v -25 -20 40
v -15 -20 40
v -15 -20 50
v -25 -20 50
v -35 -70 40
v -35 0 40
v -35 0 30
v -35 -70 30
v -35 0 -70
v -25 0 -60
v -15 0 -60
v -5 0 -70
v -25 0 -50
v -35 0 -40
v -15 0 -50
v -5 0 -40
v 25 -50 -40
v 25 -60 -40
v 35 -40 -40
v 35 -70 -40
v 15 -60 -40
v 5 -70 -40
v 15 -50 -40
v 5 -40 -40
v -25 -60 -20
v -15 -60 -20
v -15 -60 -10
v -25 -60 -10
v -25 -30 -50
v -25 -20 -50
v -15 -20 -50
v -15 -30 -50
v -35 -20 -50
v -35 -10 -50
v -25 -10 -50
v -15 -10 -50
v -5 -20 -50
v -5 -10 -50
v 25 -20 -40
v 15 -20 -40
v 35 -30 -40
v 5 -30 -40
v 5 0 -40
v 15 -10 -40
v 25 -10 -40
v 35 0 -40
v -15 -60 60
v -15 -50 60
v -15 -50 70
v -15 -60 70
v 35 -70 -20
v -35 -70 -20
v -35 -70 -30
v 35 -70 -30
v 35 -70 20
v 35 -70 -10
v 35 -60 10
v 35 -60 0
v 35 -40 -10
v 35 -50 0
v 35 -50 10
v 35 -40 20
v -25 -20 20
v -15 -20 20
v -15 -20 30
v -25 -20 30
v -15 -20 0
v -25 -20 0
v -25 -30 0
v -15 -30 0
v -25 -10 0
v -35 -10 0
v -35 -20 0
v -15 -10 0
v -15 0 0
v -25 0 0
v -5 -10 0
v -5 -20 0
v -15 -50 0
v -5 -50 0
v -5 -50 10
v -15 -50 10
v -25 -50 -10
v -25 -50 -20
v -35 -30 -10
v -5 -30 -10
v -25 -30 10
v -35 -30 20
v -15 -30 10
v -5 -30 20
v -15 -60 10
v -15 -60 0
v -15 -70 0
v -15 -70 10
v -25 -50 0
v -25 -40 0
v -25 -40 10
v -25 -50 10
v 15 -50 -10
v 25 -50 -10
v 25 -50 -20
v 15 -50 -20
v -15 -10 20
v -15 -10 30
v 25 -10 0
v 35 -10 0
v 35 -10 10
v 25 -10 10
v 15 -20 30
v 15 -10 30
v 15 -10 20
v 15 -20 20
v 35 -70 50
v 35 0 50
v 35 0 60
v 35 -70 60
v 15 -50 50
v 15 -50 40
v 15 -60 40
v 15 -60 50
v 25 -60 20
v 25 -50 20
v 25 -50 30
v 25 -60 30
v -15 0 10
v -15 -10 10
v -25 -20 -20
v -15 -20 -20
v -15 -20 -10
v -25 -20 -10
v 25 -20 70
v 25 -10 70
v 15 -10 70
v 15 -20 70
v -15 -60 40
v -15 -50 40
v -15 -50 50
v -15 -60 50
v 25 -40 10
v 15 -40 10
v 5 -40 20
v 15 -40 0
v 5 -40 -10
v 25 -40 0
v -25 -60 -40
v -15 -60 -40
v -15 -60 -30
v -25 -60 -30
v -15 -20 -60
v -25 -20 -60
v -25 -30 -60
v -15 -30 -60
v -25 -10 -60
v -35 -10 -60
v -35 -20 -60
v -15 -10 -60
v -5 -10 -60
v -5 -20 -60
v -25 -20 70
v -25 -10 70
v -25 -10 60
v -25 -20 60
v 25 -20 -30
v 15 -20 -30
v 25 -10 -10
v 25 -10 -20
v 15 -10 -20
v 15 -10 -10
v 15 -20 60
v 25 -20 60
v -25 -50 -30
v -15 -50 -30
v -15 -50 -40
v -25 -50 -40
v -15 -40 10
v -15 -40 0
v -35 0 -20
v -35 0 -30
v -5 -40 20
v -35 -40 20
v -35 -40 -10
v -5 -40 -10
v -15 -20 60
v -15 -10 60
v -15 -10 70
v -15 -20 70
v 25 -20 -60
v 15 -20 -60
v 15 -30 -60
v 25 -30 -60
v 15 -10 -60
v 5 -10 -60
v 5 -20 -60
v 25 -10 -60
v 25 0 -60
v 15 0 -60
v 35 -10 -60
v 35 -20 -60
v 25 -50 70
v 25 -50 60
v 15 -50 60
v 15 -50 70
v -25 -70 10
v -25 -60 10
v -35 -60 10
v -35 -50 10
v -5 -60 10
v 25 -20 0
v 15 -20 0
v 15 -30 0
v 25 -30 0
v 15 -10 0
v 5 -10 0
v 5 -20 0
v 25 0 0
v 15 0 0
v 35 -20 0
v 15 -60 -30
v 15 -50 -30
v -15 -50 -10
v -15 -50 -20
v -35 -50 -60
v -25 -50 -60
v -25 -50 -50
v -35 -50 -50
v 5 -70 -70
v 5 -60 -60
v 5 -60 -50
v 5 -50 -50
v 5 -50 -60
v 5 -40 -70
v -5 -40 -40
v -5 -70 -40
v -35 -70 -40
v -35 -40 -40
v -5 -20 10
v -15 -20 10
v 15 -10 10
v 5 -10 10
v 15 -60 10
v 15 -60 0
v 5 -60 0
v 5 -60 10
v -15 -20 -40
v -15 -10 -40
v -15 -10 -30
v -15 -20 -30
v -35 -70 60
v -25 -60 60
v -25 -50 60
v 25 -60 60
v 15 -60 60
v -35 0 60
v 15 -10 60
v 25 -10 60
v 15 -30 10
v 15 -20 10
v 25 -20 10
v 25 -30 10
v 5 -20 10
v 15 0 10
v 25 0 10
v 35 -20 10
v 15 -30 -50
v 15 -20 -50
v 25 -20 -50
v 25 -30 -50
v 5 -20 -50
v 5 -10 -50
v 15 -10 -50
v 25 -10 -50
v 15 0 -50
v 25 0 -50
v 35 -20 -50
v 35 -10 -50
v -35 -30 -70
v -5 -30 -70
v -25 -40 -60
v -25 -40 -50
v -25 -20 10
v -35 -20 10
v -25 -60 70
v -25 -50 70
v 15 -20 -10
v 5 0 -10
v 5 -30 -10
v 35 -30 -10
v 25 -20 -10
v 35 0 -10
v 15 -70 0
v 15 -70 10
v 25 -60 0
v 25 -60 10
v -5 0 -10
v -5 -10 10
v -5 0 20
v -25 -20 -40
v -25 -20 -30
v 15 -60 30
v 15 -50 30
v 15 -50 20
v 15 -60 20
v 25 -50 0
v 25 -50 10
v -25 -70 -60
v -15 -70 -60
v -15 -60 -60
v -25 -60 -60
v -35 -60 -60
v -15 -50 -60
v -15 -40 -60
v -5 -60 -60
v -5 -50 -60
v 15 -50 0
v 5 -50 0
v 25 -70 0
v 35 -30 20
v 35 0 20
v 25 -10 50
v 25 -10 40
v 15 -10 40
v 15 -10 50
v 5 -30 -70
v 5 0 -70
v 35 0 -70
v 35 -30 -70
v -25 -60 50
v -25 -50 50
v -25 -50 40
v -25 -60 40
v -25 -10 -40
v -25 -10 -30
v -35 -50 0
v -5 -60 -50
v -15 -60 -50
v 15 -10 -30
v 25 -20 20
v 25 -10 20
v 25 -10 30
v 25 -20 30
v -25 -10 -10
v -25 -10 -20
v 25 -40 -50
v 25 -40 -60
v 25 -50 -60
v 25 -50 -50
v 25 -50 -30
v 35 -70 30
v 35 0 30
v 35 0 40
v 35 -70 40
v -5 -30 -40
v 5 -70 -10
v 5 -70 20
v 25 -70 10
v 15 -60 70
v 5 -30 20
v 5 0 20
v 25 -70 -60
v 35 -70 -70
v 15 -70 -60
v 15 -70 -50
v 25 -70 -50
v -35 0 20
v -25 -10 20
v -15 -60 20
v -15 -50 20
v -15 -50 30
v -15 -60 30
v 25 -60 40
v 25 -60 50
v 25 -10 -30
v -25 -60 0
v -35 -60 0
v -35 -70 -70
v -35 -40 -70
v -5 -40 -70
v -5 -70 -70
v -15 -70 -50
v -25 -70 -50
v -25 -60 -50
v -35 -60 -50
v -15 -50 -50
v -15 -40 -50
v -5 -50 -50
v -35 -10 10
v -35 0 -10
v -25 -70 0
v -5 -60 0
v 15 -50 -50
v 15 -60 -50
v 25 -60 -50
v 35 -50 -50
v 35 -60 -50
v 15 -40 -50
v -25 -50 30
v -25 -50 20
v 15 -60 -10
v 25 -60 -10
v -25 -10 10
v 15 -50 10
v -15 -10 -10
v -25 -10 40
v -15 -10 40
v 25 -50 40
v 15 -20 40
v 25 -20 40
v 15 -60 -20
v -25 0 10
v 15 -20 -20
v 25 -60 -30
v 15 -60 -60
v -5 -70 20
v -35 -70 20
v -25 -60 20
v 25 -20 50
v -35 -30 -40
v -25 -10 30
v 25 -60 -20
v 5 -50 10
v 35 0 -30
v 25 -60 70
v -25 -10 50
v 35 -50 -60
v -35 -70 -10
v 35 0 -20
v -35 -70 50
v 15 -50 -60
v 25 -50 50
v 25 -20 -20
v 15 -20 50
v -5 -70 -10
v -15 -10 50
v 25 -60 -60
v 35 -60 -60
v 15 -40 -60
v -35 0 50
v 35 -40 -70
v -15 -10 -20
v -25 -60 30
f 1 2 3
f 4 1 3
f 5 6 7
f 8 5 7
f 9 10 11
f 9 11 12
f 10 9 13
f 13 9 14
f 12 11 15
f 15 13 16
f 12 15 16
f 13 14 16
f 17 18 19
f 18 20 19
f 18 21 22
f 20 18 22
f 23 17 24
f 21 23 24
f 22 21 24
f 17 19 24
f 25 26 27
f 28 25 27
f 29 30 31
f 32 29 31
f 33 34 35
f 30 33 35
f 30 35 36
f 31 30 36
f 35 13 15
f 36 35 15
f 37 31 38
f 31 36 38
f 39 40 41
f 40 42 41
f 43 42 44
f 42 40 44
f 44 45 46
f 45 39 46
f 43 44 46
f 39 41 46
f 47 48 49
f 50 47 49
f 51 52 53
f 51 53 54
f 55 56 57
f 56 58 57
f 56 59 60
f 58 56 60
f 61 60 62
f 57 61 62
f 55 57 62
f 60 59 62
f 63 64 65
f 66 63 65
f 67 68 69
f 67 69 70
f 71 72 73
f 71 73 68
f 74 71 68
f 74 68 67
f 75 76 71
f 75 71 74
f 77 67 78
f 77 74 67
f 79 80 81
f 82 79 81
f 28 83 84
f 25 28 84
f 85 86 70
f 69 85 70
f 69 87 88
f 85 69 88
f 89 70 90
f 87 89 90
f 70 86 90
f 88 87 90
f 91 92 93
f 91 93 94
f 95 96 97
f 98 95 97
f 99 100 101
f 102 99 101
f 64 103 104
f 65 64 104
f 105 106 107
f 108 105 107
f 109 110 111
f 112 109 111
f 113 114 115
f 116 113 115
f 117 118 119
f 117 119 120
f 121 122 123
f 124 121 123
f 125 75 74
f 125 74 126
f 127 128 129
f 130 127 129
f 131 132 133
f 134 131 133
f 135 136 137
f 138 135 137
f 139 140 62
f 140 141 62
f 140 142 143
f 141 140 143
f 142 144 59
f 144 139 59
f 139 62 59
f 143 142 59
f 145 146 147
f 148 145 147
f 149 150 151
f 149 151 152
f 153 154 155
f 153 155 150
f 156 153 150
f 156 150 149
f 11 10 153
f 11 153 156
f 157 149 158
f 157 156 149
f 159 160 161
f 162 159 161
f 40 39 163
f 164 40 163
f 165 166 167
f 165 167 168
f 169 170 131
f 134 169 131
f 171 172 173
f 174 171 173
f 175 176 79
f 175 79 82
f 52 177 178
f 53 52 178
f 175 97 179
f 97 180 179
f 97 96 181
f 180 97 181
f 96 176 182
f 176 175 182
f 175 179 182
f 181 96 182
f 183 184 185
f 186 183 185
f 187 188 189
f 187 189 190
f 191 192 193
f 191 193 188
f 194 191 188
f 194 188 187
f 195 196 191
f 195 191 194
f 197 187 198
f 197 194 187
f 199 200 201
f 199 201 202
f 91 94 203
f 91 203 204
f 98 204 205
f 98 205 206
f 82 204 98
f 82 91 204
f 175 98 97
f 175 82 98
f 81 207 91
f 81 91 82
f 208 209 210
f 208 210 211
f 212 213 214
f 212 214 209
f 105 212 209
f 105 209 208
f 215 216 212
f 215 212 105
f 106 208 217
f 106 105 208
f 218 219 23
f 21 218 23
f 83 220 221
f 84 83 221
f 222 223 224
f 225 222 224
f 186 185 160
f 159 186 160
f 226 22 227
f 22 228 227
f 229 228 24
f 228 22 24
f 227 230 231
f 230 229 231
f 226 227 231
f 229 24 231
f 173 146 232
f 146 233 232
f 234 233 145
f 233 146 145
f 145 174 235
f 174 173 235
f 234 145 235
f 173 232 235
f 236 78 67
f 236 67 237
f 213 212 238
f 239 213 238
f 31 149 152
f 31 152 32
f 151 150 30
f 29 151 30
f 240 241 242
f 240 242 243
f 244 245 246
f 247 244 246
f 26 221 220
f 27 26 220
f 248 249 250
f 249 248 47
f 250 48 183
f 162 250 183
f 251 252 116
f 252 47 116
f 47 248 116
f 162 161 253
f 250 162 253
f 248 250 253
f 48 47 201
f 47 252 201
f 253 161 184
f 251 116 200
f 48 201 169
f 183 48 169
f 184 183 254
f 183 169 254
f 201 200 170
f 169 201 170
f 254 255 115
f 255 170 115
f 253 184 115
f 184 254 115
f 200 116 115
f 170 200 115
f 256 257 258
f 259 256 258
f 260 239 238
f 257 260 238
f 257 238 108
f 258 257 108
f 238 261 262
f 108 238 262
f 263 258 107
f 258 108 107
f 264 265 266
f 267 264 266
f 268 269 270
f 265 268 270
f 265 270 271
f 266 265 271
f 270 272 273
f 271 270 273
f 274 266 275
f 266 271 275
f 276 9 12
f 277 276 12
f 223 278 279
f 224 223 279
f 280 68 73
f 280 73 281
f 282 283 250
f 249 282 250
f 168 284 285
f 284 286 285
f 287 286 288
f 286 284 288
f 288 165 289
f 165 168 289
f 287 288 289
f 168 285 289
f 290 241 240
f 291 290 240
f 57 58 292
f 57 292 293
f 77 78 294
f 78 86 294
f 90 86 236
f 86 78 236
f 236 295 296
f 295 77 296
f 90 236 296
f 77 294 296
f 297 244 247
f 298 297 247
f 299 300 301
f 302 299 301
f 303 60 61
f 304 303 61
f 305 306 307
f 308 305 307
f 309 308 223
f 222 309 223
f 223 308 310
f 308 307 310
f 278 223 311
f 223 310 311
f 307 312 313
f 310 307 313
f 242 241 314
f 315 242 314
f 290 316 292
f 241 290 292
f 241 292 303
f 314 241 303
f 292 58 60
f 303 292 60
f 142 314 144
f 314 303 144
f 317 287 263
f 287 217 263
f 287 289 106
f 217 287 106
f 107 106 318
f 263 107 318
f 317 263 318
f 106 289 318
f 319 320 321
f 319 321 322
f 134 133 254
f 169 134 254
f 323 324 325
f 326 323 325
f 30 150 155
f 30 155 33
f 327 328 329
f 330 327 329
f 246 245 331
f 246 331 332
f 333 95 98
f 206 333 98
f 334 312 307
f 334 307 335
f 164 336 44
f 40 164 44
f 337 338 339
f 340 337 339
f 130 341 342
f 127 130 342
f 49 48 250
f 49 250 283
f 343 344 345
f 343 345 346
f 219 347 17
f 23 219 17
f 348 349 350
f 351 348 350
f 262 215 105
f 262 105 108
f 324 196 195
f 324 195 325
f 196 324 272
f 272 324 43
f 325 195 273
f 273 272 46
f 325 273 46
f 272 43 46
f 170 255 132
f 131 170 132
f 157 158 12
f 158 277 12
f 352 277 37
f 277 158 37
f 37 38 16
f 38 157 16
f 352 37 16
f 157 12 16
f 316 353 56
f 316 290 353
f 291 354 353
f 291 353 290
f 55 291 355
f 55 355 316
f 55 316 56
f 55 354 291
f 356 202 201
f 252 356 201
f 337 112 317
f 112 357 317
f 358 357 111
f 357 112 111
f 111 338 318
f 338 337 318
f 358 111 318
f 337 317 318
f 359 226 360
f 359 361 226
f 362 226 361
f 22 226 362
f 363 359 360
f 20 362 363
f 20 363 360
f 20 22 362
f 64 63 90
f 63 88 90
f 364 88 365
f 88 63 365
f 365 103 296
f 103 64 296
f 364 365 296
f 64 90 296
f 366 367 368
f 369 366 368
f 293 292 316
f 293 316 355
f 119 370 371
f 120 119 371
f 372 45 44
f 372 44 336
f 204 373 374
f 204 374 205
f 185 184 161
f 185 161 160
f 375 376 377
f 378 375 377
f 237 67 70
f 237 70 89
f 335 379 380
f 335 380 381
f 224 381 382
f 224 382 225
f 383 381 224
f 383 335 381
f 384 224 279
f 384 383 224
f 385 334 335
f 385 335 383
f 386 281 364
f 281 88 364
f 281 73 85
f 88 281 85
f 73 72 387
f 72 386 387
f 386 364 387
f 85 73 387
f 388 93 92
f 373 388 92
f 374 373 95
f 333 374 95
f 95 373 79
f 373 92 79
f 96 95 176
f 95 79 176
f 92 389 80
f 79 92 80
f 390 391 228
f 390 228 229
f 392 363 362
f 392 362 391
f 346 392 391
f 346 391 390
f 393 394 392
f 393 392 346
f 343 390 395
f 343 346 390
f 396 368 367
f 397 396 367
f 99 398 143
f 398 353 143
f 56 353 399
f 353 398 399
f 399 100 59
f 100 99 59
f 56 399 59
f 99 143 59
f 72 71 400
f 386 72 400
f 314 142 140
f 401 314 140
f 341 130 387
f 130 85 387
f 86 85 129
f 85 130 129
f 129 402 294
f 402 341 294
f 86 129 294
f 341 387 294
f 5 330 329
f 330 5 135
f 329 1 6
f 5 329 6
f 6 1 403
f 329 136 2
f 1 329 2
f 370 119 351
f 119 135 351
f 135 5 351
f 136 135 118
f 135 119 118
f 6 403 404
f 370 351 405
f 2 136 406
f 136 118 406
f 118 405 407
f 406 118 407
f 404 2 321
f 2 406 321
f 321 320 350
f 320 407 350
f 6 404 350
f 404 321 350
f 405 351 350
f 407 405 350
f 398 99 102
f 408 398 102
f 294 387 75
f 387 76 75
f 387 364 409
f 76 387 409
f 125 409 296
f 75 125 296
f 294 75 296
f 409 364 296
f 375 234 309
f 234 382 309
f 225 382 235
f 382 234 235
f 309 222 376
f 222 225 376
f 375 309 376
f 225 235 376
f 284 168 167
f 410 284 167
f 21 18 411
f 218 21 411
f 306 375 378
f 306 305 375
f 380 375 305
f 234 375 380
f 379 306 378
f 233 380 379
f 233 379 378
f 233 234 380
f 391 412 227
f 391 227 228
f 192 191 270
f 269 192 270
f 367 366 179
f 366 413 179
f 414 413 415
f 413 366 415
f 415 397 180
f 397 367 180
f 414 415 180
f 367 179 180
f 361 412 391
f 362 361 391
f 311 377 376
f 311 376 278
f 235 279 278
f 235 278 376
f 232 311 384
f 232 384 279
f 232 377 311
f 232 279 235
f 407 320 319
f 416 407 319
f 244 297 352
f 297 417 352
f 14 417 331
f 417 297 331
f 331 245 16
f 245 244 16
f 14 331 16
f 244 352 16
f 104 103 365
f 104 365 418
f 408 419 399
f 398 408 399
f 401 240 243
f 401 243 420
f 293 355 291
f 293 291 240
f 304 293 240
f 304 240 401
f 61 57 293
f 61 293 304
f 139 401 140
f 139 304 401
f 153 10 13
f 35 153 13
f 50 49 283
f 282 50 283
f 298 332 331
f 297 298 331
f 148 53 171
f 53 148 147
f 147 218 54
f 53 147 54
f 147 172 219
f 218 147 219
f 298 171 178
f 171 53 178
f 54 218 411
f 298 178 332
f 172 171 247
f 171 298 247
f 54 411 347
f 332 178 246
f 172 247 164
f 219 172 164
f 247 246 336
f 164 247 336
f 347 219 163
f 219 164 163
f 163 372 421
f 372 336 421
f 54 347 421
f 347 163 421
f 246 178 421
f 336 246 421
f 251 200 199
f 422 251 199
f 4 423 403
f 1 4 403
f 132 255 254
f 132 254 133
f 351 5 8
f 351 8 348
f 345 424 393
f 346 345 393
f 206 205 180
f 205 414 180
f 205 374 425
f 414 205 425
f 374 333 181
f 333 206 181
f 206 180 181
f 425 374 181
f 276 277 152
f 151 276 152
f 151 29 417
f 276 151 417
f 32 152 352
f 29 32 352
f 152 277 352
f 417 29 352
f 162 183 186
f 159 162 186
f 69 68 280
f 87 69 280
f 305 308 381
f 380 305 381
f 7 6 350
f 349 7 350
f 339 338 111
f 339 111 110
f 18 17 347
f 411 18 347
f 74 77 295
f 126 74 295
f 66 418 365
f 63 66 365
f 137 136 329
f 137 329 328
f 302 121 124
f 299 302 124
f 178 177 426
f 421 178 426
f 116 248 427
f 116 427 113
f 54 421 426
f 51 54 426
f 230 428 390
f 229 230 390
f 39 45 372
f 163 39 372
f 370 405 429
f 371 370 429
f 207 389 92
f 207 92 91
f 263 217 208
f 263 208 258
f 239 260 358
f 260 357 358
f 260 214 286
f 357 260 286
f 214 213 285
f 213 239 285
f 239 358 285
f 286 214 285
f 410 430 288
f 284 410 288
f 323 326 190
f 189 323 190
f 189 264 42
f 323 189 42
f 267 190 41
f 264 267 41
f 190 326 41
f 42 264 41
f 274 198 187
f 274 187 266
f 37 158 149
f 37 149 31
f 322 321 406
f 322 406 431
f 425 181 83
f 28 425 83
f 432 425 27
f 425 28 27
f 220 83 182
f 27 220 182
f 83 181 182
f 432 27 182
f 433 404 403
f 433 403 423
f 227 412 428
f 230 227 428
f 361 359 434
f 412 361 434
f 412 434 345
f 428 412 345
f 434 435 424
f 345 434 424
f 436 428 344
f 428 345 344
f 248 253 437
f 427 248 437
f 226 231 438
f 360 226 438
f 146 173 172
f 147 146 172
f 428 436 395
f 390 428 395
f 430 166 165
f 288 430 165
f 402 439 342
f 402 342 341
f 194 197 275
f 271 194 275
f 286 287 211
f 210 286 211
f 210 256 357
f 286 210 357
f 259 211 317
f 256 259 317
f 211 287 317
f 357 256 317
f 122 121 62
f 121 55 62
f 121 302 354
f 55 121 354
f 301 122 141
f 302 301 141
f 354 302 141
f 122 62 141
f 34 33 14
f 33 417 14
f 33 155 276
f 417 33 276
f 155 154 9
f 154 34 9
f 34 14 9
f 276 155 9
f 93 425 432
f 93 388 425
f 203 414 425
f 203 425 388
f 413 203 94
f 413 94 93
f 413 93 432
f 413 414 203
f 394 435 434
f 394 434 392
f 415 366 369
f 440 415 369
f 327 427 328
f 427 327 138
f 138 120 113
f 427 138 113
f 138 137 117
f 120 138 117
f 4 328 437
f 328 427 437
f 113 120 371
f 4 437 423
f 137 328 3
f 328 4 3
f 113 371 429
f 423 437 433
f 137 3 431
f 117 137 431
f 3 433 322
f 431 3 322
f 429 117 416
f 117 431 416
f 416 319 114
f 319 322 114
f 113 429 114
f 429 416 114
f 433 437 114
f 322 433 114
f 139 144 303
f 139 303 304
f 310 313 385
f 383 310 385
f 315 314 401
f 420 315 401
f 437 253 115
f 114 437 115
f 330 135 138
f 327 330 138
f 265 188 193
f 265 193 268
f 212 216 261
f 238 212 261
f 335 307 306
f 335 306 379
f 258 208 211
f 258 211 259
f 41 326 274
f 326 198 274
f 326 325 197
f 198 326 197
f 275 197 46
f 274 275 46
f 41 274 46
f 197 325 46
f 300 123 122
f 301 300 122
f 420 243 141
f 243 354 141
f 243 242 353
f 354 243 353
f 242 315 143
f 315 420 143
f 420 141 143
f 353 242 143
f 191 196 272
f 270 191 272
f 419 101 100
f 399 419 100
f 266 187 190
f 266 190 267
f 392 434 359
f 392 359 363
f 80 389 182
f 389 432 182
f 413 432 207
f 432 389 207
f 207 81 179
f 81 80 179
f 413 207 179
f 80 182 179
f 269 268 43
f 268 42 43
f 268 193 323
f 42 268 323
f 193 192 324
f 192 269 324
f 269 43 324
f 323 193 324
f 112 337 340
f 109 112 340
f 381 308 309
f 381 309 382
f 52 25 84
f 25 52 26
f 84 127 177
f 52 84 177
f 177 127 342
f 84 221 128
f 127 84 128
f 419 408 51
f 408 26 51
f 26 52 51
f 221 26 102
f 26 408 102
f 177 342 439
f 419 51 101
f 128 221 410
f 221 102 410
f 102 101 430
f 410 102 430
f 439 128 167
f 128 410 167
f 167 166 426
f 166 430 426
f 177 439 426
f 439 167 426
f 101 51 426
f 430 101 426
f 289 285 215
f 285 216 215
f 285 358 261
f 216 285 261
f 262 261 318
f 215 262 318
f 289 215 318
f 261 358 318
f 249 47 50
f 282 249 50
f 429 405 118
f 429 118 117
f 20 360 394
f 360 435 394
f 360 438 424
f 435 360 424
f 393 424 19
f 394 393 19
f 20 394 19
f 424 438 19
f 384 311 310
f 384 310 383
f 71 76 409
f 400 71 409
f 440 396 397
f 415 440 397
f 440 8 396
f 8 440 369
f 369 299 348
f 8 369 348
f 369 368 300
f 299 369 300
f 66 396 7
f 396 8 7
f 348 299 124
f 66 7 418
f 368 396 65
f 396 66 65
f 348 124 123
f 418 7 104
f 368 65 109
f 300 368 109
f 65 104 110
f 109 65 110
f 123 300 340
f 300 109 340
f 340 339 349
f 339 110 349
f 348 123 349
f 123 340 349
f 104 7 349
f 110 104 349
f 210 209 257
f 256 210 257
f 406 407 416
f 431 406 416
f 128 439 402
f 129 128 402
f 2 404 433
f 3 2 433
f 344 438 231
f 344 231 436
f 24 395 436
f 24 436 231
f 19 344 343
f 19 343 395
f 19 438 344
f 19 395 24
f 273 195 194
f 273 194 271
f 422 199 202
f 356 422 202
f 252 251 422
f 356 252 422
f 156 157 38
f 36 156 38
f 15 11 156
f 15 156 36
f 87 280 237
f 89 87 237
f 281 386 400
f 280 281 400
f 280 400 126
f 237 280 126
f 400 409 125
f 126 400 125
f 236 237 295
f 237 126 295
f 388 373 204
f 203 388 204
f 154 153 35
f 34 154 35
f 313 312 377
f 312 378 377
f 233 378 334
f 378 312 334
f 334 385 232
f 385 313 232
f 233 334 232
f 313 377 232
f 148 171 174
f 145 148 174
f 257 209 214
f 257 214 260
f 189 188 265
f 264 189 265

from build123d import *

# Parameters (mm, degrees)
F0_W     = 10
F0_H     = 10
F0_W_2   = 30
F1_DEPTH = 70
F2_W     = 10
F2_H     = 10
F2_W_2   = 30
F2_H_2   = 30
F3_DEPTH = 100


with BuildPart() as f1:
    # F0 (on Front) → F1 (new body)
    with BuildSketch(Plane.XZ):
        Polygon((-15, 70), (-25, 70), (-25, 60), (-35, 60), (-35, 50), (-25, 50), (-25, 40), (-35, 40), (-35, 30), (-25, 30), (-25, 20), (-35, 20), (-35, -10), (-25, -10), (-25, -20), (-35, -20), (-35, -30), (-25, -30), (-25, -40), (-35, -40), (-35, -70), (-5, -70), (-5, -40), (-15, -40), (-15, -30), (15, -30), (15, -40), (5, -40), (5, -70), (35, -70), (35, -40), (25, -40), (25, -30), (35, -30), (35, -20), (25, -20), (25, -10), (35, -10), (35, 20), (25, 20), (25, 30), (35, 30), (35, 40), (25, 40), (25, 50), (35, 50), (35, 60), (25, 60), (25, 70), (15, 70), (15, 60), (-15, 60), align=None)
        with Locations((-20, -55)):
            Rectangle(F0_W, F0_H, mode=Mode.SUBTRACT)
        with Locations((20, -55)):
            Rectangle(F0_W, F0_H, mode=Mode.SUBTRACT)
        with Locations((-20, 5)):
            Rectangle(F0_W, F0_H, mode=Mode.SUBTRACT)
        Polygon((-5, -10), (-5, 20), (-15, 20), (-15, 30), (15, 30), (15, 20), (5, 20), (5, -10), (15, -10), (15, -20), (-15, -20), (-15, -10), align=None, mode=Mode.SUBTRACT)
        with Locations((20, 5)):
            Rectangle(F0_W, F0_H, mode=Mode.SUBTRACT)
        with Locations((0, 45)):
            Rectangle(F0_W_2, F0_H, mode=Mode.SUBTRACT)
    extrude(amount=F1_DEPTH)

    # F2 (on face) → F3 (cut)
    with BuildSketch(Plane.YZ.offset(35)):
        Polygon((-20, 30), (-50, 30), (-50, 20), (-40, 20), (-40, -10), (-50, -10), (-50, -20), (-20, -20), (-20, -10), (-30, -10), (-30, 20), (-20, 20), align=None)
        with Locations((-5, -15)):
            Rectangle(F2_W, F2_H)
        with Locations((-15, 5)):
            Rectangle(F2_W, F2_H)
        with Locations((-55, 5)):
            Rectangle(F2_W, F2_H)
        with Locations((-65, 25)):
            Rectangle(F2_W, F2_H)
        with Locations((-5, 25)):
            Rectangle(F2_W, F2_H)
        with Locations((-5, 45)):
            Rectangle(F2_W, F2_H)
        with Locations((-35, 45)):
            Rectangle(F2_W_2, F2_H)
        with Locations((-65, 45)):
            Rectangle(F2_W, F2_H)
        with Locations((-65, 65)):
            Rectangle(F2_W, F2_H)
        with Locations((-35, 65)):
            Rectangle(F2_W_2, F2_H)
        with Locations((-5, 65)):
            Rectangle(F2_W, F2_H)
        with Locations((-65, -15)):
            Rectangle(F2_W, F2_H)
        with Locations((-65, -35)):
            Rectangle(F2_W, F2_H)
        Polygon((-40, -40), (-30, -40), (-20, -40), (-20, -30), (-50, -30), (-50, -40), align=None)
        with Locations((-5, -35)):
            Rectangle(F2_W, F2_H)
        with Locations((-15, -55)):
            Rectangle(F2_W, F2_H)
        with Locations((-55, -55)):
            Rectangle(F2_W, F2_H)
        with Locations((-35, -55)):
            Rectangle(F2_W, F2_H_2)
    extrude(amount=-F3_DEPTH, mode=Mode.SUBTRACT)


solid = f1.part
